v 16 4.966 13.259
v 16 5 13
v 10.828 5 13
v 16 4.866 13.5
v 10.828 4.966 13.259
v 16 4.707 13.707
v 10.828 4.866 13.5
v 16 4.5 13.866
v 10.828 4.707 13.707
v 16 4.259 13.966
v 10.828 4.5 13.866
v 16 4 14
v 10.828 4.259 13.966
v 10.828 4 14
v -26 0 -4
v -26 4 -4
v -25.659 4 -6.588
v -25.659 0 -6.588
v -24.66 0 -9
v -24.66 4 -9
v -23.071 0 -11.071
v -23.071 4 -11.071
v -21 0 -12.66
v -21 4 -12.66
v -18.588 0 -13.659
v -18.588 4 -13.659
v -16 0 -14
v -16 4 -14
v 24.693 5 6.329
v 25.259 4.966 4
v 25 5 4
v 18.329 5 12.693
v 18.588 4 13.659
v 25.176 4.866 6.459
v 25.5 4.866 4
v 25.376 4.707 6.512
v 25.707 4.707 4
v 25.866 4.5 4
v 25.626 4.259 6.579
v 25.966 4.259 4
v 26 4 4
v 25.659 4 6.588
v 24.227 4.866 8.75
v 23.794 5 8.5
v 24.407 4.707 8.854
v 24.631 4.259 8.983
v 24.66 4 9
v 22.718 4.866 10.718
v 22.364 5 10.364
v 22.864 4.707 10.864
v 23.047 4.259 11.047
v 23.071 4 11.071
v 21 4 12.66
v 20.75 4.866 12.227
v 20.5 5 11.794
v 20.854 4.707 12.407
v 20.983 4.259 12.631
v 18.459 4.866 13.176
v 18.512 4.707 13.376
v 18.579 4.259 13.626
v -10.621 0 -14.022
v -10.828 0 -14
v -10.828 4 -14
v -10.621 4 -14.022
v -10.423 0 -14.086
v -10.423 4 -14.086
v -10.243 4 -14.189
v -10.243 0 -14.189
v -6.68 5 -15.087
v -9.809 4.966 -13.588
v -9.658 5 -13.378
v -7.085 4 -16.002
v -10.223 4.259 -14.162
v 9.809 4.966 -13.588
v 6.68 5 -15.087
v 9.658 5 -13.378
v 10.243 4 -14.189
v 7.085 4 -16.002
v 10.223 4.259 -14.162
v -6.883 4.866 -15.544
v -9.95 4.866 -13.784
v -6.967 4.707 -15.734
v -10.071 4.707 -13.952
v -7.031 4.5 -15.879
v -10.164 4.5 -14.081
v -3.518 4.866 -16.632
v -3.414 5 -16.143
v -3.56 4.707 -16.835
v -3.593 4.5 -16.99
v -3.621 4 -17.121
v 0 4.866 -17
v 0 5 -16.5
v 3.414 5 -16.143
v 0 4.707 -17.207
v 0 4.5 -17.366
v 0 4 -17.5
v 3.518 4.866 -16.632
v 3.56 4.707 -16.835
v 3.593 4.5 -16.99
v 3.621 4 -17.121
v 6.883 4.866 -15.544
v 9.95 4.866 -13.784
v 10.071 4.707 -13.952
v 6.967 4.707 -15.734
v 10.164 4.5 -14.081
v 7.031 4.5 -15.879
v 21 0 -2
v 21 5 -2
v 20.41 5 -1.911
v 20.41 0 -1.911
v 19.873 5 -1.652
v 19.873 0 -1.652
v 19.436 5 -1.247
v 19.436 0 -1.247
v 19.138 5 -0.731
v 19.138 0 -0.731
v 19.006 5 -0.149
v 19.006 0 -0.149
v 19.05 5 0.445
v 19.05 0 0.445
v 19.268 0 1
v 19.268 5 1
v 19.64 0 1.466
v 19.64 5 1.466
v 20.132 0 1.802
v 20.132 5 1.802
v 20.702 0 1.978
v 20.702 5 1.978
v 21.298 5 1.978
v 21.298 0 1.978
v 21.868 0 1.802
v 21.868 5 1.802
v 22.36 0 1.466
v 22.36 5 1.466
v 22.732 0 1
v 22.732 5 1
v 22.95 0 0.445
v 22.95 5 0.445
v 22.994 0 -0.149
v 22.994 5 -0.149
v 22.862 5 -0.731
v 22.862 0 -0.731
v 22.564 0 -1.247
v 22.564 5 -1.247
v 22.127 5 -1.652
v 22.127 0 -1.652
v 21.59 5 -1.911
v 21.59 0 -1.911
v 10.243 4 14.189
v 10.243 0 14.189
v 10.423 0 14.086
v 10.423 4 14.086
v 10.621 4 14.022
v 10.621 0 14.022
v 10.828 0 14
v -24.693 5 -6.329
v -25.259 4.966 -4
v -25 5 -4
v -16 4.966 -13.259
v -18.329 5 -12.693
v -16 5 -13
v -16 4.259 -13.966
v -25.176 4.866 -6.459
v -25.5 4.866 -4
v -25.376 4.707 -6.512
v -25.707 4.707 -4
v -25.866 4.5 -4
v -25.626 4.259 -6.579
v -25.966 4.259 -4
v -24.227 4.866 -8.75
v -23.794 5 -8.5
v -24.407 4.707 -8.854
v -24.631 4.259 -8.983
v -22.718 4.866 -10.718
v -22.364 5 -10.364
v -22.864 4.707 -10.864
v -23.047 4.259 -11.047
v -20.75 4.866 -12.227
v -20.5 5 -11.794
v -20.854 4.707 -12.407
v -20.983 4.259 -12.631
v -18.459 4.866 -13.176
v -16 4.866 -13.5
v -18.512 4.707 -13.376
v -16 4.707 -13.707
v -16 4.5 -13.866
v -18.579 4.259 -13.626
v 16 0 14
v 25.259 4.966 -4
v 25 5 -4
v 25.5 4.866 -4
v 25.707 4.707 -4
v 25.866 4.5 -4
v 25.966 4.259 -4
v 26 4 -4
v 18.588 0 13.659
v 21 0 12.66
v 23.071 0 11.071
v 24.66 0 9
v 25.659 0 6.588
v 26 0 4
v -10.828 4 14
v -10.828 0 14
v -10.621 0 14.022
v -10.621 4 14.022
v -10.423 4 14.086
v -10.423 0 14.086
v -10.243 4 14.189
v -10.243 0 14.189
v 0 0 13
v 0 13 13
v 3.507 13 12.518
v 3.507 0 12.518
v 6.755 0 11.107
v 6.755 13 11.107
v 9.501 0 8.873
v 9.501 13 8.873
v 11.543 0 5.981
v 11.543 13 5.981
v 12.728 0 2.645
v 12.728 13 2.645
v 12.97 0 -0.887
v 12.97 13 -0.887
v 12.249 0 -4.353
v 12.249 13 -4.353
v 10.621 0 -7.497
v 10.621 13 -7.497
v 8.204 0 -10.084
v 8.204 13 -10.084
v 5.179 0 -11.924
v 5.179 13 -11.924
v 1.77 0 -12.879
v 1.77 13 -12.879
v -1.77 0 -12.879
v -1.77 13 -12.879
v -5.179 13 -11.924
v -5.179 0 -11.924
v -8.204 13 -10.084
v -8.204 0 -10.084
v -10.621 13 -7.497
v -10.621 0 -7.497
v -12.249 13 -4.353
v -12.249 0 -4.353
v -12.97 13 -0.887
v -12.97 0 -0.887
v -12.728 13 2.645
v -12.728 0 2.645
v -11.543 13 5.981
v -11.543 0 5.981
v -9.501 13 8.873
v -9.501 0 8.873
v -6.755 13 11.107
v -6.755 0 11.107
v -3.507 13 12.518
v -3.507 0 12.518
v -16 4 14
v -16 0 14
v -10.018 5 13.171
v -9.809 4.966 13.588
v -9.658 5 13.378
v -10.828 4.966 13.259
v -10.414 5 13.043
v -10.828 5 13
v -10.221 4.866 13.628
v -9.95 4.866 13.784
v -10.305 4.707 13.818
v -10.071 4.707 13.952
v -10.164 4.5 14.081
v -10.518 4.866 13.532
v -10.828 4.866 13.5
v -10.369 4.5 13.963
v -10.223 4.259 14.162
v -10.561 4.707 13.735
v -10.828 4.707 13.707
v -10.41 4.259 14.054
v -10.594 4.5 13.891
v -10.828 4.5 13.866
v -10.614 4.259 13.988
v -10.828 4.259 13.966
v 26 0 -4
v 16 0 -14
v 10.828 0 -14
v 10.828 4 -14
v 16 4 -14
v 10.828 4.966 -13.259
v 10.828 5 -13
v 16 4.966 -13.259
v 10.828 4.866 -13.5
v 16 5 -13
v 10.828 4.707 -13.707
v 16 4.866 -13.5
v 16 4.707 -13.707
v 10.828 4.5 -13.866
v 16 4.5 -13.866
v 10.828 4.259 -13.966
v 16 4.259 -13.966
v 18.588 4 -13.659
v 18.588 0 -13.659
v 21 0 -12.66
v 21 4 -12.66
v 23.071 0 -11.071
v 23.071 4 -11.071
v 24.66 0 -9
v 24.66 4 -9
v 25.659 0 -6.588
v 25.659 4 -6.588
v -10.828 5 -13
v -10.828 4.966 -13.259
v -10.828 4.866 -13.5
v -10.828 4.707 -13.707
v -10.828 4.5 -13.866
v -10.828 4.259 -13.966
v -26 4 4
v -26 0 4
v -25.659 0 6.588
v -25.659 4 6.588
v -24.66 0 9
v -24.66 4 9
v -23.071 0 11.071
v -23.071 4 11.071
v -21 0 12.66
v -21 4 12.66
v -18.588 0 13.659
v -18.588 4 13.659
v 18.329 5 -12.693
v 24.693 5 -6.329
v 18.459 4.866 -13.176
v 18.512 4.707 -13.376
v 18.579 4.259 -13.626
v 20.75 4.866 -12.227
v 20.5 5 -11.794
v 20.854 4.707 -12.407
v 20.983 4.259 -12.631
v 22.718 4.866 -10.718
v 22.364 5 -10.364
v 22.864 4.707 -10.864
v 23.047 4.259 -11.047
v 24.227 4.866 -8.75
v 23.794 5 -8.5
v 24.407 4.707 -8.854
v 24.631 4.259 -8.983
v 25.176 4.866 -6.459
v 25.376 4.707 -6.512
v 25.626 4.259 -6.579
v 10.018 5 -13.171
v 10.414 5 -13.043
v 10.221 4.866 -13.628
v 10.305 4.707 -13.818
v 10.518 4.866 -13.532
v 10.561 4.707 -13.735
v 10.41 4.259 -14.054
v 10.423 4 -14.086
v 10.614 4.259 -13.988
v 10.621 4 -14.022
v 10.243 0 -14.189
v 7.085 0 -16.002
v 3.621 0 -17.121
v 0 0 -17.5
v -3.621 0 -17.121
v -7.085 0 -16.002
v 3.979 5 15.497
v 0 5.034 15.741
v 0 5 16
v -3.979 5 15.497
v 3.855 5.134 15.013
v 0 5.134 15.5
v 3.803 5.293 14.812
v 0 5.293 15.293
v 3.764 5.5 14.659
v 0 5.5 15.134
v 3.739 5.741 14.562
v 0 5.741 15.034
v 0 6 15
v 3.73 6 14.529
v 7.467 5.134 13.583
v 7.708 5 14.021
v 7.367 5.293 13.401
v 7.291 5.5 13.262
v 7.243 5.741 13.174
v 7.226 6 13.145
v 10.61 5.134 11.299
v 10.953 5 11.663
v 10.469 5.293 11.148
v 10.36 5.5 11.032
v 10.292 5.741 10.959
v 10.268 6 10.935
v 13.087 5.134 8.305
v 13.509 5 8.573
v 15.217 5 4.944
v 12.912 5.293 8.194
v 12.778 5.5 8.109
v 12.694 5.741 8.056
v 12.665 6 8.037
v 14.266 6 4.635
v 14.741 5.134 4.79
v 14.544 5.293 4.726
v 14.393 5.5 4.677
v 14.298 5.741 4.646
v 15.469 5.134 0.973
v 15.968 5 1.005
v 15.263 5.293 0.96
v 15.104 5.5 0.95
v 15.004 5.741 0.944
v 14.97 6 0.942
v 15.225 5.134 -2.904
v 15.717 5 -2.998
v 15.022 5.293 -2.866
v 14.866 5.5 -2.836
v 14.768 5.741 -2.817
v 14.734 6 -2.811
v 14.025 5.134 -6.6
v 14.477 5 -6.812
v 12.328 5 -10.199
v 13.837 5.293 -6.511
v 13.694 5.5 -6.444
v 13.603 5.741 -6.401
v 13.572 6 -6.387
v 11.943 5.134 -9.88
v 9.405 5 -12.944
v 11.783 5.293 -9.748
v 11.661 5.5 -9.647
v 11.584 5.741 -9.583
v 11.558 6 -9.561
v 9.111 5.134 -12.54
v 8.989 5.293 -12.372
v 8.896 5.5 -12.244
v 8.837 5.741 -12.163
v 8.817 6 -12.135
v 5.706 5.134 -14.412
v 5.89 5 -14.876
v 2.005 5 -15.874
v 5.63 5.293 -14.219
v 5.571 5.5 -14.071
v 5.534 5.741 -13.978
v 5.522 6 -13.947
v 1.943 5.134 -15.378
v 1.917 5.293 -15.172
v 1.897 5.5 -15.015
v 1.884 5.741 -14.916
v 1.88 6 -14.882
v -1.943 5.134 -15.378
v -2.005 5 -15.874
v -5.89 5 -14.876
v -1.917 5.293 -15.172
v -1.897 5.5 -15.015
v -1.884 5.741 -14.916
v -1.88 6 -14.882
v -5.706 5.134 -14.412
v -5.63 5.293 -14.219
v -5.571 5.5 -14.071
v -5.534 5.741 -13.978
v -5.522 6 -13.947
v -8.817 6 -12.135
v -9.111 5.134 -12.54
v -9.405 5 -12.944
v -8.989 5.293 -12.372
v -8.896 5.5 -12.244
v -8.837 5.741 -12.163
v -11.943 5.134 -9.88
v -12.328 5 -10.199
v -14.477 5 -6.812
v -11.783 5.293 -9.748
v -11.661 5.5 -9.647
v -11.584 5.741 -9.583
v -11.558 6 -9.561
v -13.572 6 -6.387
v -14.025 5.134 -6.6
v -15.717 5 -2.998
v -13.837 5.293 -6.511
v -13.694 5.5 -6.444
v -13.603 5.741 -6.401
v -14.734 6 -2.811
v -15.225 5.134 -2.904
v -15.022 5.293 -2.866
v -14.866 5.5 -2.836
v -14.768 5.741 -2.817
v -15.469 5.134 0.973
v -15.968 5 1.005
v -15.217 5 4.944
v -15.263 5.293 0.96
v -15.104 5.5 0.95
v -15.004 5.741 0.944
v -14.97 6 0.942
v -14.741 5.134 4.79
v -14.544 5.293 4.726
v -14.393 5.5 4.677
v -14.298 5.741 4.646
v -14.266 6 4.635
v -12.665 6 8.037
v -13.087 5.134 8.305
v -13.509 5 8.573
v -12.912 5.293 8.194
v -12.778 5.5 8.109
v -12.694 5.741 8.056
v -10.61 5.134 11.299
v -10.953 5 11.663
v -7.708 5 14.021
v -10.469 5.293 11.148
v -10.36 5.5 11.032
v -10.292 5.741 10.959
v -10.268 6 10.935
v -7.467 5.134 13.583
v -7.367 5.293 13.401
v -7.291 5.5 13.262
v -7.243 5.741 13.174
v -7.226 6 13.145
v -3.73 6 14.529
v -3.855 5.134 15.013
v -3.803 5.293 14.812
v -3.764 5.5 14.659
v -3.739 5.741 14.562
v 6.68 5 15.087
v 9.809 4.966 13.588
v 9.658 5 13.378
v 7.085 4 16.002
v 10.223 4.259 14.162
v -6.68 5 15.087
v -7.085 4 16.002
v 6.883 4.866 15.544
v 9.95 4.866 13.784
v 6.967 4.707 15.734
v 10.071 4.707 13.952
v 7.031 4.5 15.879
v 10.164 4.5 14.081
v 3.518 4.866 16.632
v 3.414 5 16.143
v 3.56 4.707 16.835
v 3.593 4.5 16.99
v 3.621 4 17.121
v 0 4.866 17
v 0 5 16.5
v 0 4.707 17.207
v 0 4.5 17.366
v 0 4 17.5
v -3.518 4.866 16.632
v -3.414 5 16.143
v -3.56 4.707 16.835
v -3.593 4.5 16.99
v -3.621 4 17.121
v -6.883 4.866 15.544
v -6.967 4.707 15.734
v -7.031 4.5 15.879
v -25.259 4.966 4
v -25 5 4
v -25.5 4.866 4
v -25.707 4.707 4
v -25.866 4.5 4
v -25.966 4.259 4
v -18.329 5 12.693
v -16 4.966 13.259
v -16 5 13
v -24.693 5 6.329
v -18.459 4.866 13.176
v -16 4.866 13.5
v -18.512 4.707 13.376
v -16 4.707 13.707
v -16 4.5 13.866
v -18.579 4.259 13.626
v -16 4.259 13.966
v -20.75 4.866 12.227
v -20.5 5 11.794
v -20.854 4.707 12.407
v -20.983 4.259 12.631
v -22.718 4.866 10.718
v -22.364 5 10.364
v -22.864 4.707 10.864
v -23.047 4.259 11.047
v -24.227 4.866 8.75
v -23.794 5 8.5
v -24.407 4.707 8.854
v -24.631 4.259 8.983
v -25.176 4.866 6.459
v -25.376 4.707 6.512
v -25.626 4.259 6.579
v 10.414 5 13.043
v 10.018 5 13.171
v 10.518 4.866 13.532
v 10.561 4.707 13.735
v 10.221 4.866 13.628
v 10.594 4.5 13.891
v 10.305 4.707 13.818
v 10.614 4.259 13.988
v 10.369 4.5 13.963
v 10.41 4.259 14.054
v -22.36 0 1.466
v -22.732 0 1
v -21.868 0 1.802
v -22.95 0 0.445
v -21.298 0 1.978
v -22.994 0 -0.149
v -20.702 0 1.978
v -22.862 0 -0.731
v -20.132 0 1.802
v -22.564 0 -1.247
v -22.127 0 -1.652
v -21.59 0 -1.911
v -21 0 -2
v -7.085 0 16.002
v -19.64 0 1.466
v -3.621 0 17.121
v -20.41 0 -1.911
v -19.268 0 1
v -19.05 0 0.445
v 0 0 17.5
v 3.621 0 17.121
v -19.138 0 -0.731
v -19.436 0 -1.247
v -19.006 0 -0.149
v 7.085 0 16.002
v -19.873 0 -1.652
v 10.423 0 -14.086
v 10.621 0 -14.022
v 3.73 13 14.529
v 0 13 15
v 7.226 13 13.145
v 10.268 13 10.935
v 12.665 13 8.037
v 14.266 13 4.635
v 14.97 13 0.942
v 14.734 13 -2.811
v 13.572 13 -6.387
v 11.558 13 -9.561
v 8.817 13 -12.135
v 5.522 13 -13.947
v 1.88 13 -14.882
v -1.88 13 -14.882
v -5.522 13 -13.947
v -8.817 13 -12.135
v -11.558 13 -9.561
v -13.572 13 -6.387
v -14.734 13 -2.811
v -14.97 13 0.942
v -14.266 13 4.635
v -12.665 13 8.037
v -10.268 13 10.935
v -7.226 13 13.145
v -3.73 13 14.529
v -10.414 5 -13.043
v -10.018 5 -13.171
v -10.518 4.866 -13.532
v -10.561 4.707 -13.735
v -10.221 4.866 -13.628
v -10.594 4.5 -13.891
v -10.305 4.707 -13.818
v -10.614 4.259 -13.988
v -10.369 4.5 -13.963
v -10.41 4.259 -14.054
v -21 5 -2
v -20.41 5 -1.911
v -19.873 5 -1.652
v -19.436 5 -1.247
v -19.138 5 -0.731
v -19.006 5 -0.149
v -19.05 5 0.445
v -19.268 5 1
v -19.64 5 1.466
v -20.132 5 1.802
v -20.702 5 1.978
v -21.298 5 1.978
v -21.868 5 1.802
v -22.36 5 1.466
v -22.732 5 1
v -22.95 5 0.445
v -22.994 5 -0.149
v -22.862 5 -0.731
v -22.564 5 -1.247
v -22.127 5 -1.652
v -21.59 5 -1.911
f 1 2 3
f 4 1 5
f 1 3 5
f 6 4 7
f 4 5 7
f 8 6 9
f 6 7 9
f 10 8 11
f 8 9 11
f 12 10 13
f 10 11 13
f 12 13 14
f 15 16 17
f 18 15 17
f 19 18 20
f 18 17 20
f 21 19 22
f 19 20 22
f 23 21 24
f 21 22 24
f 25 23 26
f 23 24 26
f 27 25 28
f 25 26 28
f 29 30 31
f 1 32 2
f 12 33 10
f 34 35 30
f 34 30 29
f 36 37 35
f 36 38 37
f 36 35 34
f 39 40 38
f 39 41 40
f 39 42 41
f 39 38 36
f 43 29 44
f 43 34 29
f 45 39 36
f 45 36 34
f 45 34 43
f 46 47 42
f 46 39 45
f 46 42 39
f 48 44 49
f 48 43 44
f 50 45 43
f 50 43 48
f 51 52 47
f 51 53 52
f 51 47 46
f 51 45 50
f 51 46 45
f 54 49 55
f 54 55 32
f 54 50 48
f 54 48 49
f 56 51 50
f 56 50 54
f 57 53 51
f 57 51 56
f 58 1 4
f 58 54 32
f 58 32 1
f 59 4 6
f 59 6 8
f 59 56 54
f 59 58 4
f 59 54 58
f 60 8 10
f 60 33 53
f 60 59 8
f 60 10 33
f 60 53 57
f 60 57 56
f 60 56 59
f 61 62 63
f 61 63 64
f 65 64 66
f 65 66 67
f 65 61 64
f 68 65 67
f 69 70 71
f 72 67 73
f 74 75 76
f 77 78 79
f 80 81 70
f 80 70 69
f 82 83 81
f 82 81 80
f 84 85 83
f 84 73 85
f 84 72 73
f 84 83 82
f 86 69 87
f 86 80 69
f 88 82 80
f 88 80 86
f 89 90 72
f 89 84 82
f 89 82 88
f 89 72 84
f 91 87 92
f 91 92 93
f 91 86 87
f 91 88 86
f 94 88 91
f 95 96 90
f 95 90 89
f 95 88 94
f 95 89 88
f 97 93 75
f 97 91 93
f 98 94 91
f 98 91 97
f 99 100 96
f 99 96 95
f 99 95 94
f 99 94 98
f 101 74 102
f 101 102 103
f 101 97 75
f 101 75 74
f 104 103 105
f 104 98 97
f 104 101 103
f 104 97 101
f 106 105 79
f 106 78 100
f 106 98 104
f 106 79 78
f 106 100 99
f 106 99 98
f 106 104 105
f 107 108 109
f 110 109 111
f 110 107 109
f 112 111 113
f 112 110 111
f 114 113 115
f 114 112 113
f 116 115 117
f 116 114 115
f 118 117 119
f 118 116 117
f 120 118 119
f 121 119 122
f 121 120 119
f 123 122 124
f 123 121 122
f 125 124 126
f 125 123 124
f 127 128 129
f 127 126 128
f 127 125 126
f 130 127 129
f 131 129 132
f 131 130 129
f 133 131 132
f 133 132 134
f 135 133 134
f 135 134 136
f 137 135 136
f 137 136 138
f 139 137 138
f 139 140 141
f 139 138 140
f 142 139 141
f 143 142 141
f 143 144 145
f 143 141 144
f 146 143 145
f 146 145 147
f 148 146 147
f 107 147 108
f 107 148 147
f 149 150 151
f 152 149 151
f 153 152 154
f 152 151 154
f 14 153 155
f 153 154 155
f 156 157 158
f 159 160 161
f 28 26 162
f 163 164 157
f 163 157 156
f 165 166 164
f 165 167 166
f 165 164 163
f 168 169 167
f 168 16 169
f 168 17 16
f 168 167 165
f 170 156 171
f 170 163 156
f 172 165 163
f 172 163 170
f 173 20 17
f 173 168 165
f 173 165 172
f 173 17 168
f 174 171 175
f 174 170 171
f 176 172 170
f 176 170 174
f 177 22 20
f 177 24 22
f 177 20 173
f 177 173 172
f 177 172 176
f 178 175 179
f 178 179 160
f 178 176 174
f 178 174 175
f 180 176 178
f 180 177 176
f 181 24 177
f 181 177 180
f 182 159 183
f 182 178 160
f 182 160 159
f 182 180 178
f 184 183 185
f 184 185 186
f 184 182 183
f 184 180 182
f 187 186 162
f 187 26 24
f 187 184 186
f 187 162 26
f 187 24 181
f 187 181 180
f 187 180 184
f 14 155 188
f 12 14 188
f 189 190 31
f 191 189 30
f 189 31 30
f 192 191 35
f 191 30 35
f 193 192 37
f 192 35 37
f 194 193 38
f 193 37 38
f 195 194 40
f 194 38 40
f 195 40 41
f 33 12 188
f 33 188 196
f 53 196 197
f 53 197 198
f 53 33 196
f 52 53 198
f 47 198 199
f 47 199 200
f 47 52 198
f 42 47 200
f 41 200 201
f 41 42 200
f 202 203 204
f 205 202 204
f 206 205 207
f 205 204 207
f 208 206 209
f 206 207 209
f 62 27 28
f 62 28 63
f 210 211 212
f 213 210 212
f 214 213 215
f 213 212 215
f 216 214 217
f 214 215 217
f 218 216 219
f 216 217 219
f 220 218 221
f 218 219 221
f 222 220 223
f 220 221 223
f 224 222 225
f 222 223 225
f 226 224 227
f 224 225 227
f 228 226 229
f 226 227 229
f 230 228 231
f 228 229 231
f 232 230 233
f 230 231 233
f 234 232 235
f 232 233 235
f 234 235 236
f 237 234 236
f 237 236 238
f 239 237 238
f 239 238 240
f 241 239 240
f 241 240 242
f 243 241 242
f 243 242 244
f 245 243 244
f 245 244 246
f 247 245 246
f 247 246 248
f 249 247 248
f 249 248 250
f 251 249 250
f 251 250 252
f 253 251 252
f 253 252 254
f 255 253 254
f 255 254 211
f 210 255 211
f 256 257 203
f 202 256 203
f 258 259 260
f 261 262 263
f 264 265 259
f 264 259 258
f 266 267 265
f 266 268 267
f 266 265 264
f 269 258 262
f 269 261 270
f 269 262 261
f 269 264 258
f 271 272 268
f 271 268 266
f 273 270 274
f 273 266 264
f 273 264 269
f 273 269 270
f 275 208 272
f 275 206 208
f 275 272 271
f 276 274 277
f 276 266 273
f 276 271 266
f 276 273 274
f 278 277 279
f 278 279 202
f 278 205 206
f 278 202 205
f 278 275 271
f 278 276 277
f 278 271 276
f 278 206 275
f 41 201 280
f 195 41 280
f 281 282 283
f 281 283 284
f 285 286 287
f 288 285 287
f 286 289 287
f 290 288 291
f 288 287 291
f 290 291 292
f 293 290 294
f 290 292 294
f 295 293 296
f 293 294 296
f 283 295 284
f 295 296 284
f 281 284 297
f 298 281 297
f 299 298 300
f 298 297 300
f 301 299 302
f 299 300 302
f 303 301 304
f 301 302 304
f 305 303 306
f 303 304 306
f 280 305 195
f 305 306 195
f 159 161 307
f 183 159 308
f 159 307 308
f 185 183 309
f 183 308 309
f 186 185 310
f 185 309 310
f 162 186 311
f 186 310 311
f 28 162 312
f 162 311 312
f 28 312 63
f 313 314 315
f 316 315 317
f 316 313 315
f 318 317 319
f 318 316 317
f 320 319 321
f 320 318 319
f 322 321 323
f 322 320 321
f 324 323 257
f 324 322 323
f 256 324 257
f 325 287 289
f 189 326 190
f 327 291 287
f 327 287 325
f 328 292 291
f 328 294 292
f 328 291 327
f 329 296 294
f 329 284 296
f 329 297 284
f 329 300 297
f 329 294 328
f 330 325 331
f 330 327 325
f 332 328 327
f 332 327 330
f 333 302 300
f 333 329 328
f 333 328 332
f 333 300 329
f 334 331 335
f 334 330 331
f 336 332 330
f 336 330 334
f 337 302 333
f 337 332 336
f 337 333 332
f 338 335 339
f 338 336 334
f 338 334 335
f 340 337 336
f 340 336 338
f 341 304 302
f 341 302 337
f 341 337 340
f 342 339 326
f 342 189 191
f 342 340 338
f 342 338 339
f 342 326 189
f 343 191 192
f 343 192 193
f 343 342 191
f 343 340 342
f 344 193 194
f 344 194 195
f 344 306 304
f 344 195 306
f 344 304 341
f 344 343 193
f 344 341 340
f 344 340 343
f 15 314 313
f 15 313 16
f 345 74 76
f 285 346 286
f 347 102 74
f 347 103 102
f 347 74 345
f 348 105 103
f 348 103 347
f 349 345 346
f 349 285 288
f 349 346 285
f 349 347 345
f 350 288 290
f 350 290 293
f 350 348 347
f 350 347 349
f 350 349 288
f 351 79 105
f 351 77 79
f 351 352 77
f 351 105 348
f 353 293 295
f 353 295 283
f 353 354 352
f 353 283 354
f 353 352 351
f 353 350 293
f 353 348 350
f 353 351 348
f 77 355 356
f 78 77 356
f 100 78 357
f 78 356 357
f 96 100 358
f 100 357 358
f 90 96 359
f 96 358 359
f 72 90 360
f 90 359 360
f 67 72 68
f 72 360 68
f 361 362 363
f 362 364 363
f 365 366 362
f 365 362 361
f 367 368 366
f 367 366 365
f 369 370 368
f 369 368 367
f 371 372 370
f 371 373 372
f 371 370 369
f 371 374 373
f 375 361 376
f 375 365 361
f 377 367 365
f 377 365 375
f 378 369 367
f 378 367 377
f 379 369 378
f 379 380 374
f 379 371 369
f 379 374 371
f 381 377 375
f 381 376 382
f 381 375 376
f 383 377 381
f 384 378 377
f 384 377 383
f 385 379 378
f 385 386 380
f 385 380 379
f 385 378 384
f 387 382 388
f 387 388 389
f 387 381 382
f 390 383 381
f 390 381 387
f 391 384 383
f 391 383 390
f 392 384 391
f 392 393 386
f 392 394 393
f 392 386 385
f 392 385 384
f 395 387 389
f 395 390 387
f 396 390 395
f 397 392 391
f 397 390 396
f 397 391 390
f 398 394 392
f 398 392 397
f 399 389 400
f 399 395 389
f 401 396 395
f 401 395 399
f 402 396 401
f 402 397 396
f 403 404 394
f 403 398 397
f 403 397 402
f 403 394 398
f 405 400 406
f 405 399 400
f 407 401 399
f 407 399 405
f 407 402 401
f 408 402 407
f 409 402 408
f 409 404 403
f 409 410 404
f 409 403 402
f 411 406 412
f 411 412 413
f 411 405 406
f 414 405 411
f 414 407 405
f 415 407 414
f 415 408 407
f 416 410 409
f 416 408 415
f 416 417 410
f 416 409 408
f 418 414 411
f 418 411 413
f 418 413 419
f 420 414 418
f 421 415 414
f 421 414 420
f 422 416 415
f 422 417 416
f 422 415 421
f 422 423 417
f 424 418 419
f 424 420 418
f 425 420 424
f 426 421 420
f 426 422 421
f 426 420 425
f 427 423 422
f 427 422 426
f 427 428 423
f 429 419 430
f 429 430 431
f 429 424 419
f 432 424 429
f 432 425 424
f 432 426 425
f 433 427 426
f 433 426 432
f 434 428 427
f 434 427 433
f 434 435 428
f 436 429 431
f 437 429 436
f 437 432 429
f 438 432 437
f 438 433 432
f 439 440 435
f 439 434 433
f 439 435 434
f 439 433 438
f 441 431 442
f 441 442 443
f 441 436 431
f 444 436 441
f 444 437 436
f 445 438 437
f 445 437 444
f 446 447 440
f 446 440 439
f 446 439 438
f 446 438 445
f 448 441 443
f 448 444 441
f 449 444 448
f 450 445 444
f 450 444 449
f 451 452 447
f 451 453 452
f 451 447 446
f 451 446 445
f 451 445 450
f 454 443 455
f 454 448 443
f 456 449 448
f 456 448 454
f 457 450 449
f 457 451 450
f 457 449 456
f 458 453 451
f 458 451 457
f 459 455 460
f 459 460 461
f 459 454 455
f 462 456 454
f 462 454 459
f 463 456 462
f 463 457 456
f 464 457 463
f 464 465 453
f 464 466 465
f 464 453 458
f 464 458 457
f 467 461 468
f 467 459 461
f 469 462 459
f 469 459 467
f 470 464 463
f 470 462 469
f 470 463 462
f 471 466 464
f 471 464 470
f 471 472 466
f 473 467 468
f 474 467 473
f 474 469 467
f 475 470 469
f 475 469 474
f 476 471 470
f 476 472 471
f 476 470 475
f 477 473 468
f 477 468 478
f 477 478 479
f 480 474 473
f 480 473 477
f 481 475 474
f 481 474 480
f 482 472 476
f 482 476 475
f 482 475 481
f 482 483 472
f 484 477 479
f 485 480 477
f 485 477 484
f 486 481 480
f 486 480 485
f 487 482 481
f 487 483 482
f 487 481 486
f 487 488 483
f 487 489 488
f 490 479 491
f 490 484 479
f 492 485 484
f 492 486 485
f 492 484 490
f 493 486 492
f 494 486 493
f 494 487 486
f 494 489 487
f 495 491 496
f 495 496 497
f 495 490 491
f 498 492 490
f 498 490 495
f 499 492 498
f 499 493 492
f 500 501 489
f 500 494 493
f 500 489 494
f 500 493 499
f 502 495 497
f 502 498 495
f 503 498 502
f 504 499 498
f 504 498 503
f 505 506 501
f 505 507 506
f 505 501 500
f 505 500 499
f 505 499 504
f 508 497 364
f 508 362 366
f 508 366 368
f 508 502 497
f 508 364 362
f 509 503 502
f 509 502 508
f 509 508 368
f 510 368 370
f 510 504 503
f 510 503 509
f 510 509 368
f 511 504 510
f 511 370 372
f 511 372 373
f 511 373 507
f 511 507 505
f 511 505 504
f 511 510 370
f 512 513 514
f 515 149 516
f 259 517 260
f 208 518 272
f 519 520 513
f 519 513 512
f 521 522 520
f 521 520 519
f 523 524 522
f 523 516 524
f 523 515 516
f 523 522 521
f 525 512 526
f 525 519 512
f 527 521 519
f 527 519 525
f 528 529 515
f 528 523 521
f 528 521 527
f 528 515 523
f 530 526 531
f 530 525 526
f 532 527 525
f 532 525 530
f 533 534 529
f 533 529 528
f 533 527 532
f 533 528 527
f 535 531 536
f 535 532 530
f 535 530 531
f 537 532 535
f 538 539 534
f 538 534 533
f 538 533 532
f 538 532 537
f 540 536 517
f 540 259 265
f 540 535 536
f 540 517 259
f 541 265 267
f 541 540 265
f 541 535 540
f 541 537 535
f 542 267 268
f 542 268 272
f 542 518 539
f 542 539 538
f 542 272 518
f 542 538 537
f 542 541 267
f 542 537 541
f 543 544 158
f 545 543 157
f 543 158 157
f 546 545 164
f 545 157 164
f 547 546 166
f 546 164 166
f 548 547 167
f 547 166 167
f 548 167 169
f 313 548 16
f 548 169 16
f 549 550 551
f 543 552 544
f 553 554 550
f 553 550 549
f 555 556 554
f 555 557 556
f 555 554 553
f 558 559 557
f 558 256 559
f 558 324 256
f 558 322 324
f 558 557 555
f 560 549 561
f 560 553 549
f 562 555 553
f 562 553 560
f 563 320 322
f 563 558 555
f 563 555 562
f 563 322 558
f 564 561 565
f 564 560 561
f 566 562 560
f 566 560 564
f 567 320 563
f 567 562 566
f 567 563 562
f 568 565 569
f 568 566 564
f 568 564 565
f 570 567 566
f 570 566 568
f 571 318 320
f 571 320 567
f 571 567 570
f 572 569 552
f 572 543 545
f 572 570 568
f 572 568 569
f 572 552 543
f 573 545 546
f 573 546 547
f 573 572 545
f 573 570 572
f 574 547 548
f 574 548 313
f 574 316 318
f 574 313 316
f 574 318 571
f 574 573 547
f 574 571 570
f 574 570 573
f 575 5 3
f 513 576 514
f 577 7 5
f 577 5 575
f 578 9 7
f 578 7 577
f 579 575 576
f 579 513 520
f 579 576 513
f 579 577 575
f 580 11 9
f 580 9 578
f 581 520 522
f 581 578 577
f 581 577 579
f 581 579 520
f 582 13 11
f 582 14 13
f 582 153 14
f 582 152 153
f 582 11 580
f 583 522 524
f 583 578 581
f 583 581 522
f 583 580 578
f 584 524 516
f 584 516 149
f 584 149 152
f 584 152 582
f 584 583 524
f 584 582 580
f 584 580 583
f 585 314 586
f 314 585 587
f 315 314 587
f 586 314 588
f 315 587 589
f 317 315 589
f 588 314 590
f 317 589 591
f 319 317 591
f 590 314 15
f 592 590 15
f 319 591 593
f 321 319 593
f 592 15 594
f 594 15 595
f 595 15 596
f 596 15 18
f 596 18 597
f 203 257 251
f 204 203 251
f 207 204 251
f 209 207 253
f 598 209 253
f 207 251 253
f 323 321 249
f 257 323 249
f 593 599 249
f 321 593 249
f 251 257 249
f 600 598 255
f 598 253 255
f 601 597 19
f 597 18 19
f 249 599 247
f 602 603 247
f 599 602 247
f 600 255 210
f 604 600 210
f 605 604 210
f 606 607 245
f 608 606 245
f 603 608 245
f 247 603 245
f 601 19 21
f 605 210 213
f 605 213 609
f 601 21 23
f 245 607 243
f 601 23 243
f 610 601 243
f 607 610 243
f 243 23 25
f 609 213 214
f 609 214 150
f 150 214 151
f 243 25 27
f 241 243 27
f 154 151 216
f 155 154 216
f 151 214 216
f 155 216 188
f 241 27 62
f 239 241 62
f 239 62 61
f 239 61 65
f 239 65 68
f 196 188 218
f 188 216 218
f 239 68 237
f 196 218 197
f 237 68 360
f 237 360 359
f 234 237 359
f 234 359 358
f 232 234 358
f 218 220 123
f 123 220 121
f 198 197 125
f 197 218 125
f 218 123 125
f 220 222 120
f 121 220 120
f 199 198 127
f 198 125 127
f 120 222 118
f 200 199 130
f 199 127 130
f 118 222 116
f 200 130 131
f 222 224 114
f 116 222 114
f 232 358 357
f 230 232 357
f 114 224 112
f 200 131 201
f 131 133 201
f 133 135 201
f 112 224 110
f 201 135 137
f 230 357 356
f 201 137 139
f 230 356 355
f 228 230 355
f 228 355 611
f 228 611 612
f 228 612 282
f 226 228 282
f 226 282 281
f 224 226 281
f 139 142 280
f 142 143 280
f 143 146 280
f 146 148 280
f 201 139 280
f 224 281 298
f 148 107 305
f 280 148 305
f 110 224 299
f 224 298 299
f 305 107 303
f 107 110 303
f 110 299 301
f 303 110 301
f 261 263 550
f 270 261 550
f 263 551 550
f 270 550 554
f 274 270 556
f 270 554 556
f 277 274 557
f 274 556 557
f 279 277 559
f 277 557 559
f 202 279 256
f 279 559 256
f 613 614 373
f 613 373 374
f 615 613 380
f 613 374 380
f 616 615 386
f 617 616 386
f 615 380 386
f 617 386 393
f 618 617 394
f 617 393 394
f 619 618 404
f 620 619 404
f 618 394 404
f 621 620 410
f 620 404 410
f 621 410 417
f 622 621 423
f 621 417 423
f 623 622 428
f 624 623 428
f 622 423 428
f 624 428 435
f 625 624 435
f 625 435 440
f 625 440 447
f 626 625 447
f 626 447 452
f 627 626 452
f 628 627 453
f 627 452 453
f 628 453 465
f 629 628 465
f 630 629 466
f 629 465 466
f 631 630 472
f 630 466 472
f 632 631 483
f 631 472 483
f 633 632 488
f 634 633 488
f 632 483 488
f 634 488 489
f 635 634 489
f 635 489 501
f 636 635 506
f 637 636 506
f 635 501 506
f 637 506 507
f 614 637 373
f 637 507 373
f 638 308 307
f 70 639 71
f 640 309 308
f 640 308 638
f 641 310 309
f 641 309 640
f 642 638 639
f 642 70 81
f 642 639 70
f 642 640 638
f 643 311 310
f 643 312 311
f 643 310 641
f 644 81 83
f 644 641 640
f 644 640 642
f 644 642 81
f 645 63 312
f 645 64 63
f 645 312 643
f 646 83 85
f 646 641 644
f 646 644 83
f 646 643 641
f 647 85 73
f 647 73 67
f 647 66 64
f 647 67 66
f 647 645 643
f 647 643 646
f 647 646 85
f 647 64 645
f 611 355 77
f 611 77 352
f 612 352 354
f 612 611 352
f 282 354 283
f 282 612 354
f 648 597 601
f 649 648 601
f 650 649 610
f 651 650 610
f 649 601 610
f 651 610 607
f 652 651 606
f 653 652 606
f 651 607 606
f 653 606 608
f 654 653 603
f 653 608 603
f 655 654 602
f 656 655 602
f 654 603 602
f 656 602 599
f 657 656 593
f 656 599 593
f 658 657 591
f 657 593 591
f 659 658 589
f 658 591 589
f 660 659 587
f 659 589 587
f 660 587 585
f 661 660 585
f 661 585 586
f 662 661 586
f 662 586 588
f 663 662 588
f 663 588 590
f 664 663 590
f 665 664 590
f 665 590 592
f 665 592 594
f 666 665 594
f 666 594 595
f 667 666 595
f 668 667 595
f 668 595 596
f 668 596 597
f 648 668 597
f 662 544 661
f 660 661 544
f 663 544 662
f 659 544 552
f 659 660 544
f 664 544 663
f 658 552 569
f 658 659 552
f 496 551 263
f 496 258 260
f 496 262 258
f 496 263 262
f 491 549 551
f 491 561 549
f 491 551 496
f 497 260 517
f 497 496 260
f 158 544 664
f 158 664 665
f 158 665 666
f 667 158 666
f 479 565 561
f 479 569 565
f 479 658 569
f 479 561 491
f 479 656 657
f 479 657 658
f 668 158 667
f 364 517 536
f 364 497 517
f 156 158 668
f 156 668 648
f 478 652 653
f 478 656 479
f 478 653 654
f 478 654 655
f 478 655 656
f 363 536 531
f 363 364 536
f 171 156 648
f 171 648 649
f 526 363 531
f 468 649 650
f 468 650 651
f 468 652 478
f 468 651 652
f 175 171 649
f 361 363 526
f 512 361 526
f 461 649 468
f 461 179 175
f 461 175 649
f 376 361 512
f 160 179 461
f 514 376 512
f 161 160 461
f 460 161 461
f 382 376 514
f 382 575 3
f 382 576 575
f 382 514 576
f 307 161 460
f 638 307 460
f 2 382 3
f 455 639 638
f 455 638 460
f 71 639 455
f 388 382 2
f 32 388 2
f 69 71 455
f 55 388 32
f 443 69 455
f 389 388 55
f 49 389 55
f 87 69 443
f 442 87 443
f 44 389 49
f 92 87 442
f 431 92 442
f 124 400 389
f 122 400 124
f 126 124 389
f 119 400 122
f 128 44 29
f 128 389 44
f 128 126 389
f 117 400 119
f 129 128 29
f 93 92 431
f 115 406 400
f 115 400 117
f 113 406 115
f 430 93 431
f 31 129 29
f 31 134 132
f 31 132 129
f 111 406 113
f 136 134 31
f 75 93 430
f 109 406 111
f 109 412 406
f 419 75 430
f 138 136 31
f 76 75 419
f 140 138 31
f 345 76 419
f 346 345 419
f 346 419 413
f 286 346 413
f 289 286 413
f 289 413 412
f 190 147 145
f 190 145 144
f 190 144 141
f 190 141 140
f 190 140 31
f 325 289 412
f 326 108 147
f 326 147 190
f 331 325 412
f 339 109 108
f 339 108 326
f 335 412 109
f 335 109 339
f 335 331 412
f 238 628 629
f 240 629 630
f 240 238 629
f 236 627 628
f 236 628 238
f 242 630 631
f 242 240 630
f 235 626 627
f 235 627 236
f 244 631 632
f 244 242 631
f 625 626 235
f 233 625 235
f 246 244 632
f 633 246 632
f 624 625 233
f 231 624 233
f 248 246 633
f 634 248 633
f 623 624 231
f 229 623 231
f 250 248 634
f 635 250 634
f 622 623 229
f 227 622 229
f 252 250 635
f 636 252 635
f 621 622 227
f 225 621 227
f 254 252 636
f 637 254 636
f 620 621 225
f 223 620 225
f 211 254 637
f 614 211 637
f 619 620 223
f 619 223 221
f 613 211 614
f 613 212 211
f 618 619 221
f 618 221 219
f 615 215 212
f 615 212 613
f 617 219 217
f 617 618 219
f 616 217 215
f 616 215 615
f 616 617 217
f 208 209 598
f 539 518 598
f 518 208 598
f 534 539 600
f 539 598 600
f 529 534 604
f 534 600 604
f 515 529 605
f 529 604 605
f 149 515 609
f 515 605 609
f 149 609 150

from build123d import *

# Parameters (mm, degrees)
SKETCH_1_W          = 52
SKETCH_1_H          = 28
EXTRUDE_1_DEPTH     = 5
SKETCH_2_R          = 17.5
EXTRUDE_2_DEPTH     = 5
SKETCH_3_R          = 15
EXTRUDE_3_DEPTH     = 8
SKETCH_4_R          = 13
CUT_EXTRUDE_1_DEPTH = 34.930075155
FILLET_1_R          = 10
SKETCH_5_R          = 2
CUT_EXTRUDE_2_DEPTH = 34.930075155
FILLET_2_R          = 1
FILLET_3_R          = 1
FILLET_4_R          = 1


with BuildPart() as part:
    # 草圖1 → 填料-伸長1 (new body)
    with BuildSketch(Plane(origin=(0, 0, 0), x_dir=(1, 0, 0), z_dir=(0, 1, 0))):
        Rectangle(SKETCH_1_W, SKETCH_1_H)
    extrude(amount=EXTRUDE_1_DEPTH)

    # 草圖2 → 填料-伸長2 (add)
    with BuildSketch(Plane(origin=(0, 0, 0), x_dir=(1, 0, 0), z_dir=(0, 1, 0))):
        Circle(SKETCH_2_R)
    extrude(amount=EXTRUDE_2_DEPTH)

    # 草圖3 → 填料-伸長3 (add)
    with BuildSketch(Plane(origin=(0, 5, 0), x_dir=(1, 0, 0), z_dir=(0, 1, 0))):
        with Locations(Location((0, 0, 0), (0, 0, 270))):
            Circle(SKETCH_3_R)
    extrude(amount=EXTRUDE_3_DEPTH)

    # 草圖4 → 除料-伸長1 (cut, through all)
    with BuildSketch(Plane(origin=(0, 13, 0), x_dir=(1, 0, 0), z_dir=(0, 1, 0))):
        with Locations(Location((0, 0, 0), (0, 0, 270))):
            Circle(SKETCH_4_R)
    extrude(amount=-CUT_EXTRUDE_1_DEPTH, mode=Mode.SUBTRACT)

    # 圓角1
    fillet_1_edges = [part.edges().sort_by_distance(p)[0] for p in [
        (-26, 2.5, -14),
        (26, 2.5, -14),
        (26, 2.5, 14),
        (-26, 2.5, 14),
    ]]
    fillet(fillet_1_edges, radius=FILLET_1_R)

    # 草圖5 → 除料-伸長2 (cut, through all)
    with BuildSketch(Plane.XZ):
        with Locations(Location((-21, 0, 0), (0, 0, 270))):
            Circle(SKETCH_5_R)
    cut_extrude_2 = extrude(amount=-CUT_EXTRUDE_2_DEPTH, mode=Mode.SUBTRACT)

    # 鏡射1: 除料-伸長2 across plane
    add(cut_extrude_2.mirror(Plane(origin=(0, 0, 0), x_dir=(0, 0, 1), z_dir=(1, 0, 0))), mode=Mode.SUBTRACT)

    # 圓角2
    fillet_2_edges = [part.edges().sort_by_distance(p)[0] for p in [
        (0, 5, -15),
    ]]
    fillet(fillet_2_edges, radius=FILLET_2_R)

    # 圓角3
    fillet_3_edges = [part.edges().sort_by_distance(p)[0] for p in [
        (10.5, 2.5, 14),
        (-10.5, 2.5, 14),
        (-10.5, 2.5, -14),
        (10.5, 2.5, -14),
    ]]
    fillet(fillet_3_edges, radius=FILLET_3_R)

    # 圓角4
    fillet_4_edges = [part.edges().sort_by_distance(p)[0] for p in [
        (13.414101957, 5, -14),
        (26, 5, 0),
        (-26, 5, 0),
        (-13.414101957, 5, 14),
        (-23.071067812, 5, -11.071067812),
        (-23.071067812, 5, 11.071067812),
        (23.071067812, 5, 11.071067812),
        (23.071067812, 5, -11.071067812),
        (0, 5, -17.5),
        (-13.414101957, 5, -14),
        (0, 5, 17.5),
        (13.414101957, 5, 14),
        (10.520641571, 5, -14.048472068),
        (-10.520641571, 5, -14.048472068),
        (-10.520641571, 5, 14.048472068),
        (10.520641571, 5, 14.048472068),
    ]]
    fillet(fillet_4_edges, radius=FILLET_4_R)


solid = part.part
